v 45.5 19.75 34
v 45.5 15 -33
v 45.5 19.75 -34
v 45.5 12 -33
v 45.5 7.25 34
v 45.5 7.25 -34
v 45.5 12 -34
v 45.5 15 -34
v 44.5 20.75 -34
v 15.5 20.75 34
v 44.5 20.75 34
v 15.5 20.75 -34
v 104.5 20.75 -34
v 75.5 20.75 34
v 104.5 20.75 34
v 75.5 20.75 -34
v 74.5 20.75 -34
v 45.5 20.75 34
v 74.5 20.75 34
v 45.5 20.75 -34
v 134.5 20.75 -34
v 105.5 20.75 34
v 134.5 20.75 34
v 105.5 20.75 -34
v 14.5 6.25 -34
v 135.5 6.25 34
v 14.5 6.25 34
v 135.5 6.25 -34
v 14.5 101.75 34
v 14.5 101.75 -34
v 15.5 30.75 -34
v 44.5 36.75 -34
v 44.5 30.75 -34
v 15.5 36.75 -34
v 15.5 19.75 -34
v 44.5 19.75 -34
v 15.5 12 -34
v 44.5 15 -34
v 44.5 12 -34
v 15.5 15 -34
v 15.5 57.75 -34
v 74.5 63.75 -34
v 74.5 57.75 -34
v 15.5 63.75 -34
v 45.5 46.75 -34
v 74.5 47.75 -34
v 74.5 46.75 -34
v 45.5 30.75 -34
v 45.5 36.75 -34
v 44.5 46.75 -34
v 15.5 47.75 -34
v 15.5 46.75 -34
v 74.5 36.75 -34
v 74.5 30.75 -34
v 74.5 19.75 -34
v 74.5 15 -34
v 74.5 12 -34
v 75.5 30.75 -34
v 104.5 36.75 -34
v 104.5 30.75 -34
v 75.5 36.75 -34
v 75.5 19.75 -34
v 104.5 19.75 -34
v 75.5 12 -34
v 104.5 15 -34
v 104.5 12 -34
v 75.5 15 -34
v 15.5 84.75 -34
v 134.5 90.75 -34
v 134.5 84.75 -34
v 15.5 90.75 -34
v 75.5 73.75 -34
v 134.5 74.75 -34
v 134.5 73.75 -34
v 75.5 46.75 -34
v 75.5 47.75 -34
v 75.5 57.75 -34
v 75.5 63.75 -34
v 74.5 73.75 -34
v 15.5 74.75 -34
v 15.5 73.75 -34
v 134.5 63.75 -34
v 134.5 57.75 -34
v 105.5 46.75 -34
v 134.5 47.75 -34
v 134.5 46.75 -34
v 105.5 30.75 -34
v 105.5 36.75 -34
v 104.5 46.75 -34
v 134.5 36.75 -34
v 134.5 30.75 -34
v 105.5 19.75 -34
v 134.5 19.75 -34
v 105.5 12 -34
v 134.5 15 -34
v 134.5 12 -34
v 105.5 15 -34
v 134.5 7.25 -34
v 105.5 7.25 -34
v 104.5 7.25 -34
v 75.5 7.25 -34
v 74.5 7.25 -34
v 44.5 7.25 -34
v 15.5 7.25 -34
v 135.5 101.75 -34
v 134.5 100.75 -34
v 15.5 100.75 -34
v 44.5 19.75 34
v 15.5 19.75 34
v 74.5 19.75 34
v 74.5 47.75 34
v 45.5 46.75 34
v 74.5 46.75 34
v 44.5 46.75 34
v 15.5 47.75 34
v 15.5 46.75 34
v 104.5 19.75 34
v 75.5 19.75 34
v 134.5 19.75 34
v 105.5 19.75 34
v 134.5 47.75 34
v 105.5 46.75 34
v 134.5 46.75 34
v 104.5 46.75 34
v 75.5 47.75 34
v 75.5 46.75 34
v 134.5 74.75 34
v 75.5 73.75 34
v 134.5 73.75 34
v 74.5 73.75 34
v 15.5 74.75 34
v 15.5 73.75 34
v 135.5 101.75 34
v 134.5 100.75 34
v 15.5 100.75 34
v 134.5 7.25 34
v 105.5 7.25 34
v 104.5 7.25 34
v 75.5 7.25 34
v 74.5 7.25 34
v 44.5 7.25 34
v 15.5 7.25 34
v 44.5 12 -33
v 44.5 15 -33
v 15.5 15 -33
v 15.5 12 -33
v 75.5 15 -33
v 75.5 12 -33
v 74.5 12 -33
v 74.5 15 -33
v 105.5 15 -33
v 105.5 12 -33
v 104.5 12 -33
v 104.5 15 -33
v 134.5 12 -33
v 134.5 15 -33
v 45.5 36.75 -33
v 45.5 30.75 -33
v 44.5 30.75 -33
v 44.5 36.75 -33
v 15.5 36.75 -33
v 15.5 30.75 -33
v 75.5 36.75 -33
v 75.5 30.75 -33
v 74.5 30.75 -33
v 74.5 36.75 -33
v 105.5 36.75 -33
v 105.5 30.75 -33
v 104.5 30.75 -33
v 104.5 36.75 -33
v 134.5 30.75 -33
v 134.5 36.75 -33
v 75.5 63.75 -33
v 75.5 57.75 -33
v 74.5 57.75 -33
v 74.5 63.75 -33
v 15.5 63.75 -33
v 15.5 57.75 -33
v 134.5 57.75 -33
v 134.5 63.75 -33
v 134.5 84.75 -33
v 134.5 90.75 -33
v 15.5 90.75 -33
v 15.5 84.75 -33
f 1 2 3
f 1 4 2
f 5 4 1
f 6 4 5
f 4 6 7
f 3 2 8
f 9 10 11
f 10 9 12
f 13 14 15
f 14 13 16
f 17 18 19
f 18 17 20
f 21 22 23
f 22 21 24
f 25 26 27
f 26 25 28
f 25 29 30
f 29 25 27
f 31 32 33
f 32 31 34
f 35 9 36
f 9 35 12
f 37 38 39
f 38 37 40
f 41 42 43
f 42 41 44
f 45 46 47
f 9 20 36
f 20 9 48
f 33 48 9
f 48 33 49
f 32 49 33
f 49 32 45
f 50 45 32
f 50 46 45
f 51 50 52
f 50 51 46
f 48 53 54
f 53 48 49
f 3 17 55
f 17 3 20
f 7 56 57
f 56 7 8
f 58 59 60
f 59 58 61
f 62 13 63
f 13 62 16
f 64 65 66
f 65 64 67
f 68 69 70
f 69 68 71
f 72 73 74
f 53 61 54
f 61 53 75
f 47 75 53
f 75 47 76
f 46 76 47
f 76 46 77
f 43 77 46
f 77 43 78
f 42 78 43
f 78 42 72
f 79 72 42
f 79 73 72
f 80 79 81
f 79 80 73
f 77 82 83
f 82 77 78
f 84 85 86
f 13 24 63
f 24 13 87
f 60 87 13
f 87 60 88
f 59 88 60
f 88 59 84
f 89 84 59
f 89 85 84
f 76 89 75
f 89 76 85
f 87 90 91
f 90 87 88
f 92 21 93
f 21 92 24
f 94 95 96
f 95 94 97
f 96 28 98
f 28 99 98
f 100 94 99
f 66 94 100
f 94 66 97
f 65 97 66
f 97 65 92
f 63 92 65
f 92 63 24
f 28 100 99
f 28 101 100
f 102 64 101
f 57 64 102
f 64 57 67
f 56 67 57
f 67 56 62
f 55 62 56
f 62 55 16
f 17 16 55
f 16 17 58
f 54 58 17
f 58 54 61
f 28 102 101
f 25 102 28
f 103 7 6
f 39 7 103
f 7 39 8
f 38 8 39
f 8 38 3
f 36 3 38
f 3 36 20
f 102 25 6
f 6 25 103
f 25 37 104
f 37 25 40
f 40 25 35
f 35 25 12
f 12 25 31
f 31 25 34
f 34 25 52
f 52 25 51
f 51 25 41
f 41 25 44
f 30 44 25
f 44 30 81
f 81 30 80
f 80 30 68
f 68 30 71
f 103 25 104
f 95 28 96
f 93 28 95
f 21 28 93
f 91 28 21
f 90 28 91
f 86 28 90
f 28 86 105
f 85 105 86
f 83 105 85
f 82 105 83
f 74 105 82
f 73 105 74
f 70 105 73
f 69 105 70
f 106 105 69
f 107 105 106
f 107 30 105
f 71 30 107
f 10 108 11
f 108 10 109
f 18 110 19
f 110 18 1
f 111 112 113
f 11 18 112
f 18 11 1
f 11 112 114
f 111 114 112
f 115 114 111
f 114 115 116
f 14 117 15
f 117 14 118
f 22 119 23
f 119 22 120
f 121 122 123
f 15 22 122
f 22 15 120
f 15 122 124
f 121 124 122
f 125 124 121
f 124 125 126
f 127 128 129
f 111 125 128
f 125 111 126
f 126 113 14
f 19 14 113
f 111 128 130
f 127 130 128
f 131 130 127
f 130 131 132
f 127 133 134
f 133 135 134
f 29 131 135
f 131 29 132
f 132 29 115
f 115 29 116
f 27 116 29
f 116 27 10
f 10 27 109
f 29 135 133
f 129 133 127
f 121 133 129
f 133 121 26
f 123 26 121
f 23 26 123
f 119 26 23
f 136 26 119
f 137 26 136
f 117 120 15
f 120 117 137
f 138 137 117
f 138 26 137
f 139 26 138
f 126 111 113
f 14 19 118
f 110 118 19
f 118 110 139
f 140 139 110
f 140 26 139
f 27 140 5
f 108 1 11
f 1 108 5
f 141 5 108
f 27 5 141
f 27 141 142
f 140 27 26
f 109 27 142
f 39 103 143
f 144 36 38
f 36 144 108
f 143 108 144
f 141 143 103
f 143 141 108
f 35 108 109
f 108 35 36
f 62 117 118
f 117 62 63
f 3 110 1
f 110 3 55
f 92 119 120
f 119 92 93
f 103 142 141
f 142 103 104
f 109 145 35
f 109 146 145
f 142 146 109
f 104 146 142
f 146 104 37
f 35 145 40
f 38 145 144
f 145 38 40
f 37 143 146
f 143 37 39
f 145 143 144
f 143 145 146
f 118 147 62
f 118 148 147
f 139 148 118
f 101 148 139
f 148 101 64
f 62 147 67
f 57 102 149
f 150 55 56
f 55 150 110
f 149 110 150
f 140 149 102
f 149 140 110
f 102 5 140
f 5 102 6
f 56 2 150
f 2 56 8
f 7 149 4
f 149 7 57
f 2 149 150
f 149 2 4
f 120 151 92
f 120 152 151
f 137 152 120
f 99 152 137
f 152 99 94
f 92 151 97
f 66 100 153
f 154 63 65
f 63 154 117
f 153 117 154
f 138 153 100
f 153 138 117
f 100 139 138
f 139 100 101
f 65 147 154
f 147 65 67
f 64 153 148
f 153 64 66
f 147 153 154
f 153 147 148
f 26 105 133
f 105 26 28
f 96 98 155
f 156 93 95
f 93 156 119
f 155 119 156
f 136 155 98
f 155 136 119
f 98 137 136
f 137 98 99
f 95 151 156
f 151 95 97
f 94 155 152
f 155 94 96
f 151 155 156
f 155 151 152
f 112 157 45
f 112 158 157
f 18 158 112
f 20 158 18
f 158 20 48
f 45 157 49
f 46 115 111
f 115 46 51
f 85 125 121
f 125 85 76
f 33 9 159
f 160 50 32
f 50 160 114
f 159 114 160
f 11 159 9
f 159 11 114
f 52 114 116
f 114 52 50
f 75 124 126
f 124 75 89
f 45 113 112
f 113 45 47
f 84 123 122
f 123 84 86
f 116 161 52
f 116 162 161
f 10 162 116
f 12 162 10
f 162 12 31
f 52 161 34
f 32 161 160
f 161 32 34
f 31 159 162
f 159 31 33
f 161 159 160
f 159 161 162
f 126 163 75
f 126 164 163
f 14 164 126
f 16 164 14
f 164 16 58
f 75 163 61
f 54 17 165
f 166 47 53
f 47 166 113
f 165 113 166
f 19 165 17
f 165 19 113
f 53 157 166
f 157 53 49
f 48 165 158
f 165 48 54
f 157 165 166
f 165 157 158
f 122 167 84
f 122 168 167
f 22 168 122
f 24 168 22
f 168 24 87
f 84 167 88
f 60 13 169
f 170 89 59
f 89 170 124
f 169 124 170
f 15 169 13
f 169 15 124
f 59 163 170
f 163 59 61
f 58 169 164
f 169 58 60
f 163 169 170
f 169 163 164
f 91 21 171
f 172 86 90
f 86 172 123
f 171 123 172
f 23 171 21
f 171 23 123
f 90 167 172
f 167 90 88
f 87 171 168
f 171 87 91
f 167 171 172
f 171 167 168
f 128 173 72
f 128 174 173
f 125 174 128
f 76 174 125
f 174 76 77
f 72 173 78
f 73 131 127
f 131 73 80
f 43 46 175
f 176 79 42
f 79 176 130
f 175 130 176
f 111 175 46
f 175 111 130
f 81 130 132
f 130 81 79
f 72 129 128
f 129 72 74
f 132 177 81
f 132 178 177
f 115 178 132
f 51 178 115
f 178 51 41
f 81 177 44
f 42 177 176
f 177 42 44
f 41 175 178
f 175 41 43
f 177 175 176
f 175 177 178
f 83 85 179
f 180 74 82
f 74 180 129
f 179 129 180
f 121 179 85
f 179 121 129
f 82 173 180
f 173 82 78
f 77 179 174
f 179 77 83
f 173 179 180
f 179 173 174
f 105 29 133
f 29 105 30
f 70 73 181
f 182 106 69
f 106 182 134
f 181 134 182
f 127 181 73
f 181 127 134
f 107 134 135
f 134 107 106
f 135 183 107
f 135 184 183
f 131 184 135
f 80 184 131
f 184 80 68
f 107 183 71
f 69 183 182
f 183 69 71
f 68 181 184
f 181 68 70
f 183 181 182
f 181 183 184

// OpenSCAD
// Half height row(s)
half_row = 1; // [0:10]

// Standard height/width row(s)
normal_row = 1; // [0:10]

//Double width row(s)
double_row = 1; // [0:10]

//Quad width row(s)
quad_row = 1; // [0:10]



grid();



module grid (){
rotate(a=[270,0,0]){
	if (half_row > 0) {
		for (row = [1:half_row]) {
			for (col = [1 : 4]) {
				translate(v = [col*30, 0, row*13.5]) {
						half_box();
				}
			}
		}
	}

	if (normal_row > 0) {
		for (row = [1:normal_row]) {
			for (col = [1 : 4]) {
				translate(v = [col*30, 0, row*27+(half_row*13.5-6.75)]) {
						box();
				}
			}
		}
	}

	if (double_row > 0) {
		for (row = [1:double_row]) {
			for (col = [1 : 2]) {
				translate(v = [col*60-15 , 0, row*27+(half_row*13.5-6.75)+(normal_row*27)]) {
						double_box();
				}
			}
		}
	}

	if (quad_row > 0) {
		for (row = [1:quad_row]) {
			translate(v = [75 , 0, row*27+(half_row*13.5-6.75)+(normal_row*27)+(double_row*27)]) {
					quad_box();
			}
		}
	}
}
}




module half_box(){
	difference() {
		cube(size = [31,68,14.5], center = true);
		cube(size = [29,70,12.5], center = true);
	}

	translate(v = [0,33.5,0]) {
		cube(size = [31,1,3], center=true);
	}

}

module box(){
	difference() {
		cube(size = [31,68,28], center = true);
		cube(size = [29,70,26], center = true);
	}

	translate(v = [0,33.5,0]) {
		cube(size = [31,1,6], center=true);
	}
}

module double_box(){
	difference() {
		cube(size = [61,68,28], center = true);
		cube(size = [59,70,26], center = true);
	}

	translate(v = [0,33.5,0]) {
		cube(size = [61,1,6], center=true);
	}
}

module quad_box(){
	difference() {
		cube(size = [121,68,28], center = true);
		cube(size = [119,70,26], center = true);
	}

	translate(v = [0,33.5,0]) {
		cube(size = [121,1,6], center=true);
	}
}
